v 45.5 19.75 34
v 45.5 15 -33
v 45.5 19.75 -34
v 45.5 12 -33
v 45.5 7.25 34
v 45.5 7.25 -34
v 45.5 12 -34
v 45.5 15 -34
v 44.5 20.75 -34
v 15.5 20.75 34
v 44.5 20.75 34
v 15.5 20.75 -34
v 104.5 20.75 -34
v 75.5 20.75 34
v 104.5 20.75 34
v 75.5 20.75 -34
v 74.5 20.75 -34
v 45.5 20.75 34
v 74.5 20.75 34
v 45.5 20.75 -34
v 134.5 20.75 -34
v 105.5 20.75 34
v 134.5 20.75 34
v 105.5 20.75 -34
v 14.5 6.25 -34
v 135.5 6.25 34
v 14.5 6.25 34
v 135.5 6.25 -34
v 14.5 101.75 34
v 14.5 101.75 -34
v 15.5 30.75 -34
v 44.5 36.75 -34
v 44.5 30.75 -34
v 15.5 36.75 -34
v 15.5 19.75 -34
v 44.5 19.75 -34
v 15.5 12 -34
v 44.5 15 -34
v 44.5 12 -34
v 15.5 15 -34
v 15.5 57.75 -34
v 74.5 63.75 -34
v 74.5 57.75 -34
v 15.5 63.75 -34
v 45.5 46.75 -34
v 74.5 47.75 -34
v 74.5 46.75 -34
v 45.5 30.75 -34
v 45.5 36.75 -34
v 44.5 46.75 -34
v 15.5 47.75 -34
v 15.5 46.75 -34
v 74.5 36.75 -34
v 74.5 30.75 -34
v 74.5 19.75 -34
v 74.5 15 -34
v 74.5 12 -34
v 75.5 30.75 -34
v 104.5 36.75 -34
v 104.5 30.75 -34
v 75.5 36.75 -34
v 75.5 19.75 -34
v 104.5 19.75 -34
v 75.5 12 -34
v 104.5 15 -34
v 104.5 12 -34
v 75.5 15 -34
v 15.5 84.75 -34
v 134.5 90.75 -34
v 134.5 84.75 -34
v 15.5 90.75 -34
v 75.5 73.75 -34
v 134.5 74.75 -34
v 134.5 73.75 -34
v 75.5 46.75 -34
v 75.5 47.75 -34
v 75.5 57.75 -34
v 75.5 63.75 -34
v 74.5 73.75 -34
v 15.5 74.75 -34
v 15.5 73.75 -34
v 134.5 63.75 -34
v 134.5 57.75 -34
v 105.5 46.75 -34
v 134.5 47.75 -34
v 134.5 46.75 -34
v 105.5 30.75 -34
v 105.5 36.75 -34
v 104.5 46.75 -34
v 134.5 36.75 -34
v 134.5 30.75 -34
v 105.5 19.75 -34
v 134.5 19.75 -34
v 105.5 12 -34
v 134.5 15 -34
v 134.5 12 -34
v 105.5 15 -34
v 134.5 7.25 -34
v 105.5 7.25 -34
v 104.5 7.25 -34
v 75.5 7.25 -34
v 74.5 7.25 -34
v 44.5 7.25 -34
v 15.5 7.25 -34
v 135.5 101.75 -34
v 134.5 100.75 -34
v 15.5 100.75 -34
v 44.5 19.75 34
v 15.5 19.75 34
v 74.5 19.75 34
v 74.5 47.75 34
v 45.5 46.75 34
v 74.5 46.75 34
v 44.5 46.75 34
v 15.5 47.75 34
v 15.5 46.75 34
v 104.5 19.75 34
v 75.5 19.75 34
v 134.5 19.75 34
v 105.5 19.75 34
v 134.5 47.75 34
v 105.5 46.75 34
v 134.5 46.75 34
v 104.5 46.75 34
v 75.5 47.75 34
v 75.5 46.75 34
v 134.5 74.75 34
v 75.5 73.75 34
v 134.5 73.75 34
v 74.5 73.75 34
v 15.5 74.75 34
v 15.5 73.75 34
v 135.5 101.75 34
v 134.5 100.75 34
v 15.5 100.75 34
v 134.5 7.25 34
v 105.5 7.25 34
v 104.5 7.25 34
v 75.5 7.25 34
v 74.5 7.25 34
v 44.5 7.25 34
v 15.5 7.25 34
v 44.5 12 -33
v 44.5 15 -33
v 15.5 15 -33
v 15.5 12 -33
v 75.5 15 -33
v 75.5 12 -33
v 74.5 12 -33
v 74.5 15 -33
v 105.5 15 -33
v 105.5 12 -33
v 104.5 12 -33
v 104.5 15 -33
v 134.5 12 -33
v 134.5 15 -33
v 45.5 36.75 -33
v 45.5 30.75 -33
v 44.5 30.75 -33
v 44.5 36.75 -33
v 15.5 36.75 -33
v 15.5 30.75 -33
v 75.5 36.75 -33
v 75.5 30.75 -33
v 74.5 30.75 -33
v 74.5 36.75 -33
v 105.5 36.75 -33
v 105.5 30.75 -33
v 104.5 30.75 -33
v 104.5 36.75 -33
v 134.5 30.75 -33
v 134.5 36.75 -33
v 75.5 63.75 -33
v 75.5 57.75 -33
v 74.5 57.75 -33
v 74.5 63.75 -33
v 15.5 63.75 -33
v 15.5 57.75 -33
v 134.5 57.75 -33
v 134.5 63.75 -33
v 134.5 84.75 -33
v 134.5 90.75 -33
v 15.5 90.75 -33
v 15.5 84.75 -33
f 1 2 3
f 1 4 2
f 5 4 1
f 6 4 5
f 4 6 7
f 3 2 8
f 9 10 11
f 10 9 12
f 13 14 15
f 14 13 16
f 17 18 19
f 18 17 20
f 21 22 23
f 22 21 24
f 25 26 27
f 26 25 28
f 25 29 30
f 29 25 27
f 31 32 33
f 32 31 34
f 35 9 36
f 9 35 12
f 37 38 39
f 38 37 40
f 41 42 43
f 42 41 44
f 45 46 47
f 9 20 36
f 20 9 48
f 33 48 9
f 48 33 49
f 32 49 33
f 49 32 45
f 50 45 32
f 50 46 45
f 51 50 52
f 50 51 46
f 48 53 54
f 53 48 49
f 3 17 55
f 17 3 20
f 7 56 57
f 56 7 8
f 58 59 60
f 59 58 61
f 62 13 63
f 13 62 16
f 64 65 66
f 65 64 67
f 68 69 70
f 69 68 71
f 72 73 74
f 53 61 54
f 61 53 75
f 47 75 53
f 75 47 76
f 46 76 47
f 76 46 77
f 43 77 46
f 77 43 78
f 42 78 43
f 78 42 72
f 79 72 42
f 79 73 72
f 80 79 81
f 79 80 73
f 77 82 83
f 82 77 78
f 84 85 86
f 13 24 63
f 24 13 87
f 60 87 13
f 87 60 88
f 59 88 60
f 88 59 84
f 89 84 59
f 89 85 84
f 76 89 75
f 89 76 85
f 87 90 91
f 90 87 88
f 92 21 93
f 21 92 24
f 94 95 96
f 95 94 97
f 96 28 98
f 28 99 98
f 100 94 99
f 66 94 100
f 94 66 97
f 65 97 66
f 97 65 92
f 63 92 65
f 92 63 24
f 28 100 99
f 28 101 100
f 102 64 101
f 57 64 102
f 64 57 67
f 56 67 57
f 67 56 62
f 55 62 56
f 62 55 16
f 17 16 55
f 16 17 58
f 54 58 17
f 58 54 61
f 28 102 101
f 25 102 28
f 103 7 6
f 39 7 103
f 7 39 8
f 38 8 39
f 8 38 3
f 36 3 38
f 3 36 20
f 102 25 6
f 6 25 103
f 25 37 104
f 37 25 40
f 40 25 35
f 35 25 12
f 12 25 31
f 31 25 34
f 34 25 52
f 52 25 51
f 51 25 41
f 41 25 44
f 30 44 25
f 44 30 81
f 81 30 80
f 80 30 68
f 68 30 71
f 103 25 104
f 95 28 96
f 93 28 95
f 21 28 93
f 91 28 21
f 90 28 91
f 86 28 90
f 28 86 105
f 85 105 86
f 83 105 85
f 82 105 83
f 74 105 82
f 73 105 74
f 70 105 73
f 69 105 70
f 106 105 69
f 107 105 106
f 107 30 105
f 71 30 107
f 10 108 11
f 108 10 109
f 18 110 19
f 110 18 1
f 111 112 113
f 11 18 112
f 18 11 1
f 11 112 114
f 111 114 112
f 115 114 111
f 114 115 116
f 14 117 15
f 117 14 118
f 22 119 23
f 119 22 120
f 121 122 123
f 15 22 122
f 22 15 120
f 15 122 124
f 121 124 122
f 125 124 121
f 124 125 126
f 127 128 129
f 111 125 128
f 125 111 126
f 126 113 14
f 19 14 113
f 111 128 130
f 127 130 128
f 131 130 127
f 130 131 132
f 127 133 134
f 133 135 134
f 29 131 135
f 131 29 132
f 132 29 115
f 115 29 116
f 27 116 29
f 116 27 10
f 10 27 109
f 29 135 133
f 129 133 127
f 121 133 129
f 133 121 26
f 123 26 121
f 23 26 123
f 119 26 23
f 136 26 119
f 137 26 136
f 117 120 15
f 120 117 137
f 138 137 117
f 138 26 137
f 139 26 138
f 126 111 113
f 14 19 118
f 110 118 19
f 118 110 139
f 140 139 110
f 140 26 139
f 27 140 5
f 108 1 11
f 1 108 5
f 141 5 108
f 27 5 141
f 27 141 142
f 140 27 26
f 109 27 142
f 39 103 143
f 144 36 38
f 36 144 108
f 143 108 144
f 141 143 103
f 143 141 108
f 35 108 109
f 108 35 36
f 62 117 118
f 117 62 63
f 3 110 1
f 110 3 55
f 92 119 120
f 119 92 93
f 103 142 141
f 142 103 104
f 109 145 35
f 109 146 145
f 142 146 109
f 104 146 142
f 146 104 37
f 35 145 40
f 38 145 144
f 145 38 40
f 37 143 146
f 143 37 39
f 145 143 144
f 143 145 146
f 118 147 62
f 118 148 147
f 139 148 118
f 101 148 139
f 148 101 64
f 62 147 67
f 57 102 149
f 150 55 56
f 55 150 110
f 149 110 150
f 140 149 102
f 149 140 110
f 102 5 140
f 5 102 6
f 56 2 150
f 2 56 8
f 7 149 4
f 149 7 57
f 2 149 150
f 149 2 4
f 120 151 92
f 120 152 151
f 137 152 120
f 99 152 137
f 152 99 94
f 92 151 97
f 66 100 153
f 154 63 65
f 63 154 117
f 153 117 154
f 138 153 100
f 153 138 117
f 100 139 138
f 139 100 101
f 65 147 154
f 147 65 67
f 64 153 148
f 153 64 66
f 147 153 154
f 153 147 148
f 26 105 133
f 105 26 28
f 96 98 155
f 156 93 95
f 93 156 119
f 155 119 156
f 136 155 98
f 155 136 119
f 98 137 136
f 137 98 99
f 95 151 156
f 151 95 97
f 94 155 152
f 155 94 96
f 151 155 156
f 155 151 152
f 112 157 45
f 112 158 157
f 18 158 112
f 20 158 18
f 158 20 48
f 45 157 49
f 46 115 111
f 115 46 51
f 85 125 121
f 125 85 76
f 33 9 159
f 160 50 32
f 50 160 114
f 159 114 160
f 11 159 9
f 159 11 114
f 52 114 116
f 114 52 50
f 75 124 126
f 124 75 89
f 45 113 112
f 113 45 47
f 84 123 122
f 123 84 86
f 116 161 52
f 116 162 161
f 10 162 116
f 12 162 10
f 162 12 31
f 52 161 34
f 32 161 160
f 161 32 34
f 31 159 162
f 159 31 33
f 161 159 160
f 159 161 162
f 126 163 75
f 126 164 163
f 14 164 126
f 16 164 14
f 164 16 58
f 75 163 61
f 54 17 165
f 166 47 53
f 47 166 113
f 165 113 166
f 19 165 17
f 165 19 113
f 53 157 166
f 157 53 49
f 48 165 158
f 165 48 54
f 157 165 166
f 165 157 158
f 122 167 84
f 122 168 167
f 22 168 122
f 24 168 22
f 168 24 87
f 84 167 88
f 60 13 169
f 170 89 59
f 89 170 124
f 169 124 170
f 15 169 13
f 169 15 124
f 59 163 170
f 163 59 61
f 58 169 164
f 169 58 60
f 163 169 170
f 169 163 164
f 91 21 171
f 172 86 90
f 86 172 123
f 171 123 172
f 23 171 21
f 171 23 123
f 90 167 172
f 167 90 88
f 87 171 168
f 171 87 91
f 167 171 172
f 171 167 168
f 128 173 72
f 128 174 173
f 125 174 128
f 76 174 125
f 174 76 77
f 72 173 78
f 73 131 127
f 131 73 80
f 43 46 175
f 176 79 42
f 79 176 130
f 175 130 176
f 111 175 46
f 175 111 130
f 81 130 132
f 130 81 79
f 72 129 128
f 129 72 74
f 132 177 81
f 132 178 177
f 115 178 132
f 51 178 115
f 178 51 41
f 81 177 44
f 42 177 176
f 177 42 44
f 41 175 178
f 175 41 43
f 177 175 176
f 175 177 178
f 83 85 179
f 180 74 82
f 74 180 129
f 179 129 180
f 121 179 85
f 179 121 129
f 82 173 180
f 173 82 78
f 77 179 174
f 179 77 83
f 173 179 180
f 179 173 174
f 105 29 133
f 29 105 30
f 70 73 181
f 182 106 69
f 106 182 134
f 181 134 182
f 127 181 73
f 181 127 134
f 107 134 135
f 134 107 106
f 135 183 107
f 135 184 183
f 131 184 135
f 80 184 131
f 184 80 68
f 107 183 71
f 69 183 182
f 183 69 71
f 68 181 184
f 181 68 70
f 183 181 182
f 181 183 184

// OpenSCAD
// Half height row(s)
half_row = 1; // [0:10]

// Standard height/width row(s)
normal_row = 1; // [0:10]

//Double width row(s)
double_row = 1; // [0:10]

//Quad width row(s)
quad_row = 1; // [0:10]



grid();



module grid (){
rotate(a=[270,0,0]){
	if (half_row > 0) {
		for (row = [1:half_row]) {
			for (col = [1 : 4]) {
				translate(v = [col*30, 0, row*13.5]) {
						half_box();
				}
			}
		}
	}

	if (normal_row > 0) {
		for (row = [1:normal_row]) {
			for (col = [1 : 4]) {
				translate(v = [col*30, 0, row*27+(half_row*13.5-6.75)]) {
						box();
				}
			}
		}
	}

	if (double_row > 0) {
		for (row = [1:double_row]) {
			for (col = [1 : 2]) {
				translate(v = [col*60-15 , 0, row*27+(half_row*13.5-6.75)+(normal_row*27)]) {
						double_box();
				}
			}
		}
	}

	if (quad_row > 0) {
		for (row = [1:quad_row]) {
			translate(v = [75 , 0, row*27+(half_row*13.5-6.75)+(normal_row*27)+(double_row*27)]) {
					quad_box();
			}
		}
	}
}
}




module half_box(){
	difference() {
		cube(size = [31,68,14.5], center = true);
		cube(size = [29,70,12.5], center = true);
	}

	translate(v = [0,33.5,0]) {
		cube(size = [31,1,3], center=true);
	}

}

module box(){
	difference() {
		cube(size = [31,68,28], center = true);
		cube(size = [29,70,26], center = true);
	}

	translate(v = [0,33.5,0]) {
		cube(size = [31,1,6], center=true);
	}
}

module double_box(){
	difference() {
		cube(size = [61,68,28], center = true);
		cube(size = [59,70,26], center = true);
	}

	translate(v = [0,33.5,0]) {
		cube(size = [61,1,6], center=true);
	}
}

module quad_box(){
	difference() {
		cube(size = [121,68,28], center = true);
		cube(size = [119,70,26], center = true);
	}

	translate(v = [0,33.5,0]) {
		cube(size = [121,1,6], center=true);
	}
}
